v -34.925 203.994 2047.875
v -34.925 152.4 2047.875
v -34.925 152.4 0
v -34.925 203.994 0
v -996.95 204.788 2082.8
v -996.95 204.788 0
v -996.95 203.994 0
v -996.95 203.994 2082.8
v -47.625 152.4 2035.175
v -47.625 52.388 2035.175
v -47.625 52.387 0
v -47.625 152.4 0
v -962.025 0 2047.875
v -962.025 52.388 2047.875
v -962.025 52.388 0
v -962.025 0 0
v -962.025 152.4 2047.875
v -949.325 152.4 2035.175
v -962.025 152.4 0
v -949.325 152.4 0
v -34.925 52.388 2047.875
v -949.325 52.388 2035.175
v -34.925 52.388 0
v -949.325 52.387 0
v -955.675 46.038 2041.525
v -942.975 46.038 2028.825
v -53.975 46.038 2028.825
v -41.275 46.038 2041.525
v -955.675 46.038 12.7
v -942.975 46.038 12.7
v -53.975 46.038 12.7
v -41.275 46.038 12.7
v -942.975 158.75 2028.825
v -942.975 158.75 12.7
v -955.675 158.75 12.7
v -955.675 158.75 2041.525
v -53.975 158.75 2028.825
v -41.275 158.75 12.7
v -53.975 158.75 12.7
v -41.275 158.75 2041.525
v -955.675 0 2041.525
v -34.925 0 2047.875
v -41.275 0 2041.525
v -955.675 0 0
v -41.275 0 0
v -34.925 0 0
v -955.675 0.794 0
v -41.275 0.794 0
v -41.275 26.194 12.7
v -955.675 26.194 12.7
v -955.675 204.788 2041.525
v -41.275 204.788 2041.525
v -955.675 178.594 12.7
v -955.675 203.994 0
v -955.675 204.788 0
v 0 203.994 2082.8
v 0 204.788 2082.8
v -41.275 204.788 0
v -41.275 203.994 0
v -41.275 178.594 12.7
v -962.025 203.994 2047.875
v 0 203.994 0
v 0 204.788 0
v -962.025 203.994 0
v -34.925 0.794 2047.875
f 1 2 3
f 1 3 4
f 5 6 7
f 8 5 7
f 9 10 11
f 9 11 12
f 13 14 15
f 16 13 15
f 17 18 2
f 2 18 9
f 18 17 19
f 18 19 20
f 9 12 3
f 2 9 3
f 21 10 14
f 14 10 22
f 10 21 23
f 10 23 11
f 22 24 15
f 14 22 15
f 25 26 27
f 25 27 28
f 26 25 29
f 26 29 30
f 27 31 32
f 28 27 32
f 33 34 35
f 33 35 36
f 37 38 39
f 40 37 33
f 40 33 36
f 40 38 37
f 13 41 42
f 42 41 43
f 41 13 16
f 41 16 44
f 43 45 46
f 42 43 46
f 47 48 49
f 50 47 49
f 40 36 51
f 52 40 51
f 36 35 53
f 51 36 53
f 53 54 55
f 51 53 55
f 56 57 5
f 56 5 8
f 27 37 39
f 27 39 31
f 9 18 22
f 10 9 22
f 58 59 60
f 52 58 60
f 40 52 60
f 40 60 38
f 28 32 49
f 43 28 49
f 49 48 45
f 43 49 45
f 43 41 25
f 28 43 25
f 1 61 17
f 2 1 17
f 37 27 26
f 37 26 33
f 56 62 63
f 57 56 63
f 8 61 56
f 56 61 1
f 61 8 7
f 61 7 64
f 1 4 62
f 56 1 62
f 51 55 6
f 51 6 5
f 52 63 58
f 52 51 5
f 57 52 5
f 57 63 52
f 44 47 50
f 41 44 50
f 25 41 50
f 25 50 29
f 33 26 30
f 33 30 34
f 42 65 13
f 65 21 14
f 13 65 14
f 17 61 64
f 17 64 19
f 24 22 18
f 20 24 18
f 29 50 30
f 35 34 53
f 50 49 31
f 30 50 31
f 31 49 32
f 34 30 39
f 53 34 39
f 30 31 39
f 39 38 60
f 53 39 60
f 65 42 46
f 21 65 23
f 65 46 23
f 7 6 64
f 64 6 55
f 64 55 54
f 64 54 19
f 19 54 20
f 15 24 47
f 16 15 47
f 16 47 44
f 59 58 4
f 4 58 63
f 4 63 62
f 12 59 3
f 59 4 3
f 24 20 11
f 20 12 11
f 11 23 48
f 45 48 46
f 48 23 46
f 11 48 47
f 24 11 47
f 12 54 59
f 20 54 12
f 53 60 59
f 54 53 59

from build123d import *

# Parameters (mm, degrees)
F1_DEPTH  = 2082.8
F3_DEPTH  = 204.7885
F5_DEPTH  = 996.95
F7_DEPTH  = 204.7885
F10_DEPTH = 914.4
F12_DEPTH = 0.79475
F13_W     = 6.35
F13_H     = 100.0125
F14_DEPTH = 2082.801


with BuildPart() as f1:
    # F0 (on Top) → F1 (new body)
    with BuildSketch(Plane.XY):
        Polygon((-41.275, 46.0375), (-41.275, 0), (0, 0), (0, 0.79375), (-34.925, 0.79375), (-34.925, 52.3875), (-47.625, 52.3875), (-47.625, 152.4), (-34.925, 152.4), (-34.925, 203.99375), (0, 203.99375), (0, 204.7875), (-41.275, 204.7875), (-41.275, 158.75), (-53.975, 158.75), (-53.975, 46.0375), align=None)
    extrude(amount=F1_DEPTH)


with BuildPart() as f1b:
    # F0 (on Top) → F1, piece 2 (new body)
    with BuildSketch(Plane.XY):
        Polygon((-996.95, 0.79375), (-996.95, 0), (-955.675, 0), (-955.675, 46.0375), (-942.975, 46.0375), (-942.975, 158.75), (-955.675, 158.75), (-955.675, 204.7875), (-996.95, 204.7875), (-996.95, 203.99375), (-962.025, 203.99375), (-962.025, 152.4), (-949.325, 152.4), (-949.325, 52.3875), (-962.025, 52.3875), (-962.025, 0.79375), align=None)
    extrude(amount=F1_DEPTH)


with BuildPart() as f3_tool:
    # F2 (on Front) → F3 (new body, through all)
    with BuildSketch(Plane.XZ):
        Polygon((0, 2082.8), (-996.95, 2082.8), (-498.475, 1584.325), align=None)
    extrude(amount=-F3_DEPTH)


with BuildPart() as f1_1:
    add(f1.part)

    # F3: cut by f3_tool
    add(f3_tool.part, mode=Mode.SUBTRACT)


with BuildPart() as f1b_1:
    add(f1b.part)

    # F3: cut by f3_tool
    add(f3_tool.part, mode=Mode.SUBTRACT)


with BuildPart() as f5:
    # F4 (on Right) → F5 (new body, through all)
    with BuildSketch(Plane.YZ):
        Polygon((158.75, 2041.525), (204.7875, 2041.525), (204.7875, 2082.8), (203.99375, 2082.8), (203.99375, 2047.875), (152.4, 2047.875), (152.4, 2035.175), (52.3875, 2035.175), (52.3875, 2047.875), (0.79375, 2047.875), (0.79375, 2082.8), (0, 2082.8), (0, 2041.525), (46.0375, 2041.525), (46.0375, 2028.825), (158.75, 2028.825), align=None)
    extrude(amount=-F5_DEPTH)

    # F6 (on Front) → F7 (cut, through all)
    with BuildSketch(Plane.XZ):
        Polygon((0, 2082.8), (-498.475, 1584.325), (304.8, 1584.325), (304.8, 2082.8), align=None)
        Polygon((-498.475, 1584.325), (-996.95, 2082.8), (-1301.75, 2082.8), (-1301.75, 1584.325), align=None)
    extrude(amount=-F7_DEPTH, mode=Mode.SUBTRACT)


with BuildPart() as f1_2:
    add(f1_1.part)

    # F8: union F1b, F5
    add(f1b_1.part)
    add(f5.part)

    # F9 (on face) → F10 (join, through all)
    with BuildSketch(Plane(origin=(-41.275, 0, 0), x_dir=(0, -1, 0), z_dir=(-1, 0, 0))):
        Polygon((-203.99375, 0), (-102.39375, 0), (-0.79375, 0), (-26.19375, 12.7), (-102.39375, 12.7), (-178.59375, 12.7), align=None)
    extrude(amount=F10_DEPTH)

    # F11 (on face) → F12 (cut, through all)
    with BuildSketch(Plane(origin=(0, 0.79375, 0), x_dir=(-1, 0, 0), z_dir=(0, 1, 0))):
        Polygon((34.9250000001, 2047.875), (962.025, 2047.875), (962.025, 0), (996.95, 0), (996.95, 2082.8), (1e-10, 2082.8), (0, 0), (34.925, 0), align=None)
    extrude(amount=-F12_DEPTH, mode=Mode.SUBTRACT)

    # F13 (on Top) → F14 (cut, through all)
    with BuildSketch(Plane.XY):
        with Locations((-44.45, 102.39375)):
            Rectangle(F13_W, F13_H)
        with Locations((-952.5, 102.39375)):
            Rectangle(F13_W, F13_H)
    extrude(amount=F14_DEPTH, mode=Mode.SUBTRACT)


solid = f1_2.part
